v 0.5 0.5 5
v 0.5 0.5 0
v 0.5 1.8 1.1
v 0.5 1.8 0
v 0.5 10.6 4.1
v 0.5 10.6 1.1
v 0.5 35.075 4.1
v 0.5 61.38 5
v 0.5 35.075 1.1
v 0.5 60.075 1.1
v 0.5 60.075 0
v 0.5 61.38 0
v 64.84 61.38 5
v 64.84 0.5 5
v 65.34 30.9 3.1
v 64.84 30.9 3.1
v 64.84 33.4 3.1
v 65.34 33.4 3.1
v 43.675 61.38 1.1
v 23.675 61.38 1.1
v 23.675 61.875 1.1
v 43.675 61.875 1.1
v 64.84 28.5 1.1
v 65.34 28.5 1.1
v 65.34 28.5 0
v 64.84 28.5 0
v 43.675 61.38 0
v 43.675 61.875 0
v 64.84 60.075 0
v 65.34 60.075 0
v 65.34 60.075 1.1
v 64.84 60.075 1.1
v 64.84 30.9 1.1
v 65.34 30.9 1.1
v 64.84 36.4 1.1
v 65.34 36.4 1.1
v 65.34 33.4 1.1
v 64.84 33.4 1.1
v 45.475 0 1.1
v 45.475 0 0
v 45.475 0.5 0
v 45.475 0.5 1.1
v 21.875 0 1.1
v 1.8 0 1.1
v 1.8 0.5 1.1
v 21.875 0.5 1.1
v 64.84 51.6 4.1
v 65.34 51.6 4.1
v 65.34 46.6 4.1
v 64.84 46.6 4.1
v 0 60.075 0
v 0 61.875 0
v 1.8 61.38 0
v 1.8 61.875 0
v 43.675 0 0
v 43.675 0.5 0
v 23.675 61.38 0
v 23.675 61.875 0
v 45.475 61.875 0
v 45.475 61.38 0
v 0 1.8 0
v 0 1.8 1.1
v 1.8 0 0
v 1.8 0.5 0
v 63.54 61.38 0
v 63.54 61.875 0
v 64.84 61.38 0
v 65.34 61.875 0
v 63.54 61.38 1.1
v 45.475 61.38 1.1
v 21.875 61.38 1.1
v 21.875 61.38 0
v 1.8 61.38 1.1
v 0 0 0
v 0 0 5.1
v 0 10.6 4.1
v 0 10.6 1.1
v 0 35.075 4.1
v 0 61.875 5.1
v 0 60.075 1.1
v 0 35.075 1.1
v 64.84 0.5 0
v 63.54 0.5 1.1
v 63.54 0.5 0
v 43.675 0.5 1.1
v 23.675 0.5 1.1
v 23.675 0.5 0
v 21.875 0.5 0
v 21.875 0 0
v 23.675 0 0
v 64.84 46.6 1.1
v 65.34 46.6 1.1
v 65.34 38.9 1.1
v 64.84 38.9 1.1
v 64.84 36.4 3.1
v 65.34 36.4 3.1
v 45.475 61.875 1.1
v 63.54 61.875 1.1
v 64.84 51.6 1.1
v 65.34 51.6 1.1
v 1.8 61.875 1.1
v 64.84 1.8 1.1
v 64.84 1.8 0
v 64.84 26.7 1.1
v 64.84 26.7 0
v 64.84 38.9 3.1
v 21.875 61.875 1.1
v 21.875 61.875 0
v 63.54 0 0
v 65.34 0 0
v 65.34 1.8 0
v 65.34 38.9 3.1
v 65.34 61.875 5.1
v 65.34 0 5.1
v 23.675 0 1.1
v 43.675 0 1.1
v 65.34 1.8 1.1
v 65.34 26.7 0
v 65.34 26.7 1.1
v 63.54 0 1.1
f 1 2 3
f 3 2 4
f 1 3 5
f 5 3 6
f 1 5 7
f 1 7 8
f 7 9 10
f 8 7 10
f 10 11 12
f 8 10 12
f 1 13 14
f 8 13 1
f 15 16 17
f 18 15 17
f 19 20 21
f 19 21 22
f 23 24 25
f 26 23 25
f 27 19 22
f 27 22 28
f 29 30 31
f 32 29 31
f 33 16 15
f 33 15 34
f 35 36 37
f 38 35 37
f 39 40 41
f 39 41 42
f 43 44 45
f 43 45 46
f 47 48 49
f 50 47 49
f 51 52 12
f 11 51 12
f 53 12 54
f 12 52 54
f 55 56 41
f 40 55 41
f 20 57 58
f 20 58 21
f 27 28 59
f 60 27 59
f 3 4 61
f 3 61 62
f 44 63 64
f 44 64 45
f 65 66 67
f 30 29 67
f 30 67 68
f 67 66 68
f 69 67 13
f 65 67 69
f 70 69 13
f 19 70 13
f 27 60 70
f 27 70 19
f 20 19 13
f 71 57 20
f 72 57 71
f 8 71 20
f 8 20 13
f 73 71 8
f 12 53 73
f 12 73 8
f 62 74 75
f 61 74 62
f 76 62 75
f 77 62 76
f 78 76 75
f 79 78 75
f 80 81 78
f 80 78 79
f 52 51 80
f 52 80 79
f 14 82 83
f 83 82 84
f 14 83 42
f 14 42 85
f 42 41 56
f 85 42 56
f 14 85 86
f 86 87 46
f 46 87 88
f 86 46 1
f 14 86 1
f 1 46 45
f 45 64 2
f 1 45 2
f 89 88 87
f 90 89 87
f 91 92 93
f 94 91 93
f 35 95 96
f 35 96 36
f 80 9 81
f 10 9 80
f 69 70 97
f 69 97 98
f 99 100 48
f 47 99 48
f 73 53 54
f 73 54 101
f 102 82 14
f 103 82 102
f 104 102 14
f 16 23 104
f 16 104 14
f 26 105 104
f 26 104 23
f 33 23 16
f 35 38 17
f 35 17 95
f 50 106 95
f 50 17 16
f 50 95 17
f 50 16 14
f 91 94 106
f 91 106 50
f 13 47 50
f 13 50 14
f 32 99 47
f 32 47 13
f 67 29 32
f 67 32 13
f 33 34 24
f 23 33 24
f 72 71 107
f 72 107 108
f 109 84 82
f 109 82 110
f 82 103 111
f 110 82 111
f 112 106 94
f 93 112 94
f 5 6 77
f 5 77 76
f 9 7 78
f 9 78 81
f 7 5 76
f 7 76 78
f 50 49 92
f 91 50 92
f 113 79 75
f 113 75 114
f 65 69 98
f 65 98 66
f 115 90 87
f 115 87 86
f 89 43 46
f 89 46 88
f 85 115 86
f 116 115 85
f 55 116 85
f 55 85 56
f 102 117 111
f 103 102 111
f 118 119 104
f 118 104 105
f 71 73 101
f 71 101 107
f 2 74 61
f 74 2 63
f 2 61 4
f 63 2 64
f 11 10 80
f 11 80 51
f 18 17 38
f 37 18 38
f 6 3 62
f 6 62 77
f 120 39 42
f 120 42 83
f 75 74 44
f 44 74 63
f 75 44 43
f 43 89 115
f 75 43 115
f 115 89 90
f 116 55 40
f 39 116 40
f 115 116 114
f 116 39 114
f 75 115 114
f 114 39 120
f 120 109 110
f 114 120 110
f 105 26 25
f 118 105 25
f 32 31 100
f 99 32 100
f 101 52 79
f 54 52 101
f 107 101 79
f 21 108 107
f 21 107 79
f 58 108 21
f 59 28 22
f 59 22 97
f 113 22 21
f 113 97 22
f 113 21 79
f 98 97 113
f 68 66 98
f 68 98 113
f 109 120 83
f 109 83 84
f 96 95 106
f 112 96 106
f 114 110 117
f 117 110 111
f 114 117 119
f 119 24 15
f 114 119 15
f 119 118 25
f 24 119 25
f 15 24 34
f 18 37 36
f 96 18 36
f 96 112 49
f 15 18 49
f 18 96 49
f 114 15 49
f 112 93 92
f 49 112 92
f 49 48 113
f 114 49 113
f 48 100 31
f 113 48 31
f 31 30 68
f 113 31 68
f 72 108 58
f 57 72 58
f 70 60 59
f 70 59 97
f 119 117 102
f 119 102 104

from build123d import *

# Parameters (mm, degrees)
SKETCH_1_W               = 65.34
SKETCH_1_H               = 61.875
EXTRUDE_1_DEPTH          = 5.1
CUT_EXTRUDE_1_DEPTH      = 0.5
SKETCH_2_3_W             = 1.1
SKETCH_2_3_H             = 24.9
CUT_EXTRUDE_2_DEPTH      = 0.5
SKETCH_3_OUTSIDE_W       = 85.366
SKETCH_3_OUTSIDE_H       = 81.901
SKETCH_3_OUTSIDE_W_2     = 65.34
SKETCH_3_OUTSIDE_H_2     = 61.875
SKETCH_3_OUTSIDE_W_3     = 64.34
SKETCH_3_OUTSIDE_H_3     = 60.88
CUT_EXTRUDE_4_DEPTH      = 5
CUT_EXTRUDE_6_DEPTH      = 91.13235393
CUT_EXTRUDE_6_DEPTH_BACK = 91.13235393
CUT_EXTRUDE_7_DEPTH      = 91.13235393
CUT_EXTRUDE_7_DEPTH_BACK = 0.6
CUT_EXTRUDE_START        = -0.5
CUT_EXTRUDE_8_OUTLINE_W  = 2
CUT_EXTRUDE_8_OUTLINE_H  = 2.5
CUT_EXTRUDE_8_DEPTH      = 0.5


# Read off the part's stored shape, not the designer's step: 切除-拉伸8
with BuildPart() as part:
    # 草图1 → 凸台-拉伸1 (new body)
    with BuildSketch(Plane.XY):
        with Locations((32.67, 30.9375)):
            Rectangle(SKETCH_1_W, SKETCH_1_H)
    extrude(amount=EXTRUDE_1_DEPTH)

    # 草图2 → 切除-拉伸1 (cut)
    with BuildSketch(Plane(origin=(65.34, 0, 0), x_dir=(0, 0, -1), z_dir=(1, 0, 0))):
        Polygon((0, 28.5), (0, 60.075), (-1.1, 60.075), (-1.1, 51.6), (-4.1, 51.6), (-4.1, 46.6), (-1.1, 46.6), (-1.1, 28.5), align=None)
    extrude(amount=-CUT_EXTRUDE_1_DEPTH, mode=Mode.SUBTRACT)

    # 草图2<3> → 切除-拉伸2 (cut)
    with BuildSketch(Plane(origin=(65.34, 0, 0), x_dir=(0, 0, -1), z_dir=(1, 0, 0))):
        with Locations((-0.55, 14.25)):
            Rectangle(SKETCH_2_3_W, SKETCH_2_3_H)
    extrude(amount=-CUT_EXTRUDE_2_DEPTH, mode=Mode.SUBTRACT)

    # 草图3 outside → 切除-拉伸4 (cut)
    # profile 1 of 2: a face of its own
    with BuildSketch(Plane(origin=(0, 0, 0), x_dir=(-1, 0, 0), z_dir=(0, 0, -1))):
        with Locations((-32.67, 30.9375)):
            Rectangle(SKETCH_3_OUTSIDE_W, SKETCH_3_OUTSIDE_H)
        with Locations((-32.67, 30.9375)):
            Rectangle(SKETCH_3_OUTSIDE_W_2, SKETCH_3_OUTSIDE_H_2, mode=Mode.SUBTRACT)
    # profile 2 of 2: a face of its own
    with BuildSketch(Plane(origin=(0, 0, 0), x_dir=(-1, 0, 0), z_dir=(0, 0, -1))):
        with Locations((-32.67, 30.94)):
            Rectangle(SKETCH_3_OUTSIDE_W_3, SKETCH_3_OUTSIDE_H_3)
    extrude(amount=-CUT_EXTRUDE_4_DEPTH, mode=Mode.SUBTRACT)

    # 草图6 → 切除-拉伸6 (cut, two sides: drawn at the far end of the back side and taken through both)
    with BuildSketch(Plane(origin=(0, 0, 0), x_dir=(1, 0, 0), z_dir=(0, 1, 0)).offset(-CUT_EXTRUDE_6_DEPTH_BACK)):
        Polygon((-141.077467171, 0), (0, 0), (1.8, 0), (1.8, -1.1), (21.875, -1.1), (21.875, 0), (23.675, 0), (23.675, -1.1), (43.675, -1.1), (43.675, 0), (45.475, 0), (45.475, -1.1), (63.54, -1.1), (63.54, 0), (65.34, 0), (206.417467171, 0), (206.417467171, 282.154934342), (-141.077467171, 282.154934342), align=None)
    extrude(amount=CUT_EXTRUDE_6_DEPTH + CUT_EXTRUDE_6_DEPTH_BACK, mode=Mode.SUBTRACT)

    # 草图13 → 切除-拉伸7 (cut, two sides: drawn at the far end of the back side and taken through both)
    with BuildSketch(Plane.ZY.offset(-CUT_EXTRUDE_7_DEPTH_BACK)):
        Polygon((1.1, 60.075), (0, 60.075), (0, 1.8), (1.1, 1.8), (1.1, 10.6), (4.1, 10.6), (4.1, 35.075), (1.1, 35.075), align=None)
    extrude(amount=CUT_EXTRUDE_7_DEPTH + CUT_EXTRUDE_7_DEPTH_BACK, mode=Mode.SUBTRACT)

    # 切除-拉伸8 outline → 切除-拉伸8 (cut)
    with BuildSketch(Plane(origin=(65.34, 0, 0), x_dir=(0, 0, -1), z_dir=(1, 0, 0)).offset(CUT_EXTRUDE_START)):
        with Locations((-2.1, 32.15)):
            Rectangle(CUT_EXTRUDE_8_OUTLINE_W, CUT_EXTRUDE_8_OUTLINE_H)
        with Locations((-2.1, 37.65)):
            Rectangle(CUT_EXTRUDE_8_OUTLINE_W, CUT_EXTRUDE_8_OUTLINE_H)
    extrude(amount=CUT_EXTRUDE_8_DEPTH, mode=Mode.SUBTRACT)


solid = part.part
